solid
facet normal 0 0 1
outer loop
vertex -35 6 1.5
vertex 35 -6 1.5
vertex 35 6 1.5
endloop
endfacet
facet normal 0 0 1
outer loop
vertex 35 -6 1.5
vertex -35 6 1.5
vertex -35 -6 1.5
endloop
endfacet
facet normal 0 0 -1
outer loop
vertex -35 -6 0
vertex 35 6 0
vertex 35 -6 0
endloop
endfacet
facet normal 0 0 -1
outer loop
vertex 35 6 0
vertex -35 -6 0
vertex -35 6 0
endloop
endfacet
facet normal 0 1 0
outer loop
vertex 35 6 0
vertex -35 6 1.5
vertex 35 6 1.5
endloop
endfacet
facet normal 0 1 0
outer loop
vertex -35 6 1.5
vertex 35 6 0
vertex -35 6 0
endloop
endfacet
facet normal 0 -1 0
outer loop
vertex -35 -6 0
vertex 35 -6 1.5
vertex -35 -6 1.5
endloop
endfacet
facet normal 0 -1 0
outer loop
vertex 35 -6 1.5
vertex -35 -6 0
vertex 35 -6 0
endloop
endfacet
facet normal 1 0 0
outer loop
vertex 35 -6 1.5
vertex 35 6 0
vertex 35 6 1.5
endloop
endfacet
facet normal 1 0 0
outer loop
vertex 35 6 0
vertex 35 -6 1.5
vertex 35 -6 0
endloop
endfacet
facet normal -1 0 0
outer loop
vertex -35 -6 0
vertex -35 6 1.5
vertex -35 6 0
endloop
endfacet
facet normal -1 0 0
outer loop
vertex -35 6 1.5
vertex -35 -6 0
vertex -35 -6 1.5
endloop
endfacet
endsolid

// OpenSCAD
// 10-well agarose gel comb, printed flat on the bed (Z = 0).
// All dimensions in millimetres.

// --- Named dimensions ---
plate_thick   = 1.5;   // Z thickness of the flat plate
spine_len     = 70;    // X length of the straight spine (back bar)
spine_width   = 12;    // Y width of the spine
tooth_width   = 5.0;   // X width of each rectangular tooth
tooth_len     = 12;    // Y length of each tooth (hangs in -Y from the spine)
gap           = 1.5;   // X gap between neighbouring teeth
n_tooth       = 10;    // number of teeth

// --- Derived values ---
// Total X span of the tooth row (10 teeth + 9 gaps)
row_span = n_tooth * tooth_width + (n_tooth - 1) * gap;

// X position of the left edge of the first tooth so the row is centred on the spine
x0 = -row_span / 2;

// Y position of the spine's front edge (teeth hang from this edge in -Y)
spine_front_y = spine_width / 2;

// Y position of the tooth tips (front edge of spine minus tooth length)
tooth_tip_y = spine_front_y - tooth_len;

// --- Build the comb ---
$fn = 64;

union() {
    // Straight spine (back bar), centred on the origin in X and Y
    translate([-spine_len / 2, -spine_width / 2, 0])
        cube([spine_len, spine_width, plate_thick], center = false);

    // 10 rectangular teeth hanging in -Y from the spine's front edge
    for (i = [0 : n_tooth - 1]) {
        tx = x0 + i * (tooth_width + gap);   // left X edge of tooth i
        ty = tooth_tip_y;                    // front (tip) Y edge of tooth i
        translate([tx, ty, 0])
            cube([tooth_width, tooth_len, plate_thick], center = false);
    }
}
